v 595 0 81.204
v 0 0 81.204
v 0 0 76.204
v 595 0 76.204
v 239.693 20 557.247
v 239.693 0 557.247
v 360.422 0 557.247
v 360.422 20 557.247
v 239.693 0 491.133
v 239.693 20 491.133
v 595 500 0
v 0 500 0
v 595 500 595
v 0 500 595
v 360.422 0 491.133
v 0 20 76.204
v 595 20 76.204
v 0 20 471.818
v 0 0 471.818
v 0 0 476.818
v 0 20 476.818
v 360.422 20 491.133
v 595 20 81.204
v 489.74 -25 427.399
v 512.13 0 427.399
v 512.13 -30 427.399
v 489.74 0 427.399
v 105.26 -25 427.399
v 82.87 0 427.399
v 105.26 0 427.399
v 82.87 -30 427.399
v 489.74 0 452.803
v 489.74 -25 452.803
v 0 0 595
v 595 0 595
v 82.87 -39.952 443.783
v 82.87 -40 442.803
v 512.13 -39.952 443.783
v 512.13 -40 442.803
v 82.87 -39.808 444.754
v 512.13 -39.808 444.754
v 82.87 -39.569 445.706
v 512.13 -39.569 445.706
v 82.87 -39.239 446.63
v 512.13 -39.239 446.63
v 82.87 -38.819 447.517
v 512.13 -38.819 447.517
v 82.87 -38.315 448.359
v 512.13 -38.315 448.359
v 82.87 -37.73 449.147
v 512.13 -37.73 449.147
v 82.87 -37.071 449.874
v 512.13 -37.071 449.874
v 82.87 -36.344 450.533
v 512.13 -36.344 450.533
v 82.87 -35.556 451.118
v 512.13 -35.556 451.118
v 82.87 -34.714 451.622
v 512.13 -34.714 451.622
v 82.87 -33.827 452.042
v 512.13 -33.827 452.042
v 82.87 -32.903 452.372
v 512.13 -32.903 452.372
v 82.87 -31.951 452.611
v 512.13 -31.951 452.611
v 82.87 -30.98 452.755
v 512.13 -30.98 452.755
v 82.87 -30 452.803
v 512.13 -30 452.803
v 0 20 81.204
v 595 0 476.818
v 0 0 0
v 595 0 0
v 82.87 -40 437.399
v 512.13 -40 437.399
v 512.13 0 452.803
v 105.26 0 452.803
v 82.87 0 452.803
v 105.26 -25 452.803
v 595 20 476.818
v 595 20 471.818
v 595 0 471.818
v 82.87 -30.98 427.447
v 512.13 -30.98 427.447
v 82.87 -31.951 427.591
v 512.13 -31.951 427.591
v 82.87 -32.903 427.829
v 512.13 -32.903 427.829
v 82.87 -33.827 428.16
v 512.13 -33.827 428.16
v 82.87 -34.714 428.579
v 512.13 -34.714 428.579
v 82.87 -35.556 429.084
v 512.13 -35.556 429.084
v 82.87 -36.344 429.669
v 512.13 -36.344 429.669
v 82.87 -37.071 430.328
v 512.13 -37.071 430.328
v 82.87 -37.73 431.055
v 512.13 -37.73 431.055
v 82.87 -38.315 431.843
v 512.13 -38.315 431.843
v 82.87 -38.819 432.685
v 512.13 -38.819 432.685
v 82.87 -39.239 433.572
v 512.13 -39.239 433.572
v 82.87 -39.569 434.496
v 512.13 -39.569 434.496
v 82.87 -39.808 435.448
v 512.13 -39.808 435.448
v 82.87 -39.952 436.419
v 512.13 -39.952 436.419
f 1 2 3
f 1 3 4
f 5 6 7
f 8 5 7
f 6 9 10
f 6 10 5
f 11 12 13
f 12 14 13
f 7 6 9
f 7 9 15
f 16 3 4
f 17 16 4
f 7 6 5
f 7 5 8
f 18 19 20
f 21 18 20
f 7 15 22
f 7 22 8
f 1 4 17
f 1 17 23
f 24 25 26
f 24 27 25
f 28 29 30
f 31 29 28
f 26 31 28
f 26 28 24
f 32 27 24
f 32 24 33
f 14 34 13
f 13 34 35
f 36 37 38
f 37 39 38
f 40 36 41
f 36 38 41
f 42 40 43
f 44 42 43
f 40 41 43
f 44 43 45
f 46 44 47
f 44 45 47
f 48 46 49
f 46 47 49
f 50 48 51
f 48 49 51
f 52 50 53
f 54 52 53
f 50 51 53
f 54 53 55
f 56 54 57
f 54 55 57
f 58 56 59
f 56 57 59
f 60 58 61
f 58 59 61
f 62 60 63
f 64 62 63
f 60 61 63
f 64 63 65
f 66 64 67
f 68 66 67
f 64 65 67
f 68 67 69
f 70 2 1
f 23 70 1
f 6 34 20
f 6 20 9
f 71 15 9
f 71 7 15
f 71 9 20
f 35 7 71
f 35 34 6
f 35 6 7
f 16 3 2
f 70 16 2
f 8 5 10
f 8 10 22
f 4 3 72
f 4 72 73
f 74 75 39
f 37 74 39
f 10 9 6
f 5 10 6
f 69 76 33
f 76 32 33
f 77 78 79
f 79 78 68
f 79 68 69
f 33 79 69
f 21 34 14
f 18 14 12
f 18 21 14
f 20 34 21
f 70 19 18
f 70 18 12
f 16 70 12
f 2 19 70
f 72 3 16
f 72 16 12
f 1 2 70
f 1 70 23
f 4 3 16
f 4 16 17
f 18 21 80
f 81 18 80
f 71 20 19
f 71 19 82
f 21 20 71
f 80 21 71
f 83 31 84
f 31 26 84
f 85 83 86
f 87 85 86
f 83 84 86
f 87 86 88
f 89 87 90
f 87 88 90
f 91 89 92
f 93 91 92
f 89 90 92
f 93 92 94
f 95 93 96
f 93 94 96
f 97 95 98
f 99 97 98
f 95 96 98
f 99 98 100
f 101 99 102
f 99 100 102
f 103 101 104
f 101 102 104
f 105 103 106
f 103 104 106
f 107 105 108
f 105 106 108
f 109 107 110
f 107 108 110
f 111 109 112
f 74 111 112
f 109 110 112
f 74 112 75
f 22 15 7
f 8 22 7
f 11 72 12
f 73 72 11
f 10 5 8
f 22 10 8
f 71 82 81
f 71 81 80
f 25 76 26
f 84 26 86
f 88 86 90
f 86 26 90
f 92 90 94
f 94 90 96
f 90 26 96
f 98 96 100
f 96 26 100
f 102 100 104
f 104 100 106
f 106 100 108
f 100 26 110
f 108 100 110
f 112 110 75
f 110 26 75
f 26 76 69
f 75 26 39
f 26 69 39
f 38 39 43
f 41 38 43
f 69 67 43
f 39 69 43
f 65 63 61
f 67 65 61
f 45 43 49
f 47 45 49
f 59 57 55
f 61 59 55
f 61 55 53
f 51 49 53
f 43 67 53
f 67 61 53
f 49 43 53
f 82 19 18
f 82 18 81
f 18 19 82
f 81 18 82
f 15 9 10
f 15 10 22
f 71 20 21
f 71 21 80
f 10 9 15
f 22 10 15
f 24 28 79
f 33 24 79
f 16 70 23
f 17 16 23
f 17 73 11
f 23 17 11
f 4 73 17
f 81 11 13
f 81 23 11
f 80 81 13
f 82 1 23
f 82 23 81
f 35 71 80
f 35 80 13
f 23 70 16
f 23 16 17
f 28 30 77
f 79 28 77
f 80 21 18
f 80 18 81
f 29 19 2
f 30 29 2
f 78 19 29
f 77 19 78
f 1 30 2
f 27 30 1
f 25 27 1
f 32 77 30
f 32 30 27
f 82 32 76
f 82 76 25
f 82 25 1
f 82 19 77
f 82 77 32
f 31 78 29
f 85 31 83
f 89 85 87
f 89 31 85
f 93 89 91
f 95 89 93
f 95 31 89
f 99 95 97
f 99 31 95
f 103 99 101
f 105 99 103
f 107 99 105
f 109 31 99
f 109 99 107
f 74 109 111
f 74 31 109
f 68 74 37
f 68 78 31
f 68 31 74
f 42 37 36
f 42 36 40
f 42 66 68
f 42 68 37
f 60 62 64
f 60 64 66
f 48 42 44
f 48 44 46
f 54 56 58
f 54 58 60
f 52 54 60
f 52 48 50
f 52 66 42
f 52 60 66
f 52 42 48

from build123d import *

# Parameters (mm, degrees)
F0_W     = 595
F0_H     = 390.6140801311
F0_H_2   = 118.1821537018
F0_W_2   = 120.7290142775
F0_H_3   = 66.1135315895
F0_H_4   = 76.2037661672
F0_H_5   = 5
F1_DEPTH = 500
F2_DEPTH = 20
F5_W     = 22.3901420832
F5_H     = 25.404214859
F6_DEPTH = 25
F7_W     = 15
F7_H     = 25.404214859
F8_DEPTH = 429.2594653368
F9_R     = 10


with BuildPart() as f1:
    # F0 (on Front) → F1 (new body)
    with BuildSketch(Plane.XZ):
        with Locations((297.5, 276.5108062327)):
            Rectangle(F0_W, F0_H)
        with Locations((297.5, 535.9089231491)):
            Rectangle(F0_W, F0_H_2)
        with Locations((300.05774647, 524.1899192333)):
            Rectangle(F0_W_2, F0_H_3, mode=Mode.SUBTRACT)
        with Locations((297.5, 38.1018830836)):
            Rectangle(F0_W, F0_H_4)
        with Locations((300.05774647, 524.1899192333)):
            Rectangle(F0_W_2, F0_H_3)
        with Locations((297.5, 78.7037661672)):
            Rectangle(F0_W, F0_H_5)
        with Locations((297.5, 474.3178462982)):
            Rectangle(F0_W, F0_H_5)
    extrude(amount=-F1_DEPTH)


with BuildPart() as f2:
    # F0 (on Front) → F2 (new body)
    with BuildSketch(Plane.XZ):
        with Locations((300.05774647, 524.1899192333)):
            Rectangle(F0_W_2, F0_H_3)
    extrude(amount=-F2_DEPTH)


with BuildPart() as f2b:
    # F0 (on Front) → F2, piece 2 (new body)
    with BuildSketch(Plane.XZ):
        with Locations((297.5, 474.3178462982)):
            Rectangle(F0_W, F0_H_5)
    extrude(amount=-F2_DEPTH)


with BuildPart() as f2c:
    # F0 (on Front) → F2, piece 3 (new body)
    with BuildSketch(Plane.XZ):
        with Locations((297.5, 78.7037661672)):
            Rectangle(F0_W, F0_H_5)
    extrude(amount=-F2_DEPTH)


with BuildPart() as f1_1:
    add(f1.part)

    # F3: cut F2, F2b, F2c
    add(f2.part, mode=Mode.SUBTRACT)
    add(f2b.part, mode=Mode.SUBTRACT)
    add(f2c.part, mode=Mode.SUBTRACT)

    # F5 (on face) → F6 (join)
    with BuildSketch(Plane.XZ):
        with Locations((94.0653383732, 440.1007890701)):
            Rectangle(F5_W, F5_H)
        with Locations((500.9346616268, 440.1007890701)):
            Rectangle(F5_W, F5_H)
    extrude(amount=F6_DEPTH)

    # F7 (on face) → F8 (join, through all)
    with BuildSketch(Plane(origin=(82.8702673316, 0, 0), x_dir=(0, -1, 0), z_dir=(-1, 0, 0))):
        with Locations((32.5, 440.1007890701)):
            Rectangle(F7_W, F7_H)
    extrude(amount=-F8_DEPTH)

    # F9
    f9_edges = [f1_1.edges().sort_by_distance(p)[0] for p in [
        (297.5, -40, 452.802896),
        (297.5, -40, 427.398682),
    ]]
    fillet(f9_edges, radius=F9_R)


solid = Compound([f2.part, f2b.part, f2c.part, f1_1.part])
